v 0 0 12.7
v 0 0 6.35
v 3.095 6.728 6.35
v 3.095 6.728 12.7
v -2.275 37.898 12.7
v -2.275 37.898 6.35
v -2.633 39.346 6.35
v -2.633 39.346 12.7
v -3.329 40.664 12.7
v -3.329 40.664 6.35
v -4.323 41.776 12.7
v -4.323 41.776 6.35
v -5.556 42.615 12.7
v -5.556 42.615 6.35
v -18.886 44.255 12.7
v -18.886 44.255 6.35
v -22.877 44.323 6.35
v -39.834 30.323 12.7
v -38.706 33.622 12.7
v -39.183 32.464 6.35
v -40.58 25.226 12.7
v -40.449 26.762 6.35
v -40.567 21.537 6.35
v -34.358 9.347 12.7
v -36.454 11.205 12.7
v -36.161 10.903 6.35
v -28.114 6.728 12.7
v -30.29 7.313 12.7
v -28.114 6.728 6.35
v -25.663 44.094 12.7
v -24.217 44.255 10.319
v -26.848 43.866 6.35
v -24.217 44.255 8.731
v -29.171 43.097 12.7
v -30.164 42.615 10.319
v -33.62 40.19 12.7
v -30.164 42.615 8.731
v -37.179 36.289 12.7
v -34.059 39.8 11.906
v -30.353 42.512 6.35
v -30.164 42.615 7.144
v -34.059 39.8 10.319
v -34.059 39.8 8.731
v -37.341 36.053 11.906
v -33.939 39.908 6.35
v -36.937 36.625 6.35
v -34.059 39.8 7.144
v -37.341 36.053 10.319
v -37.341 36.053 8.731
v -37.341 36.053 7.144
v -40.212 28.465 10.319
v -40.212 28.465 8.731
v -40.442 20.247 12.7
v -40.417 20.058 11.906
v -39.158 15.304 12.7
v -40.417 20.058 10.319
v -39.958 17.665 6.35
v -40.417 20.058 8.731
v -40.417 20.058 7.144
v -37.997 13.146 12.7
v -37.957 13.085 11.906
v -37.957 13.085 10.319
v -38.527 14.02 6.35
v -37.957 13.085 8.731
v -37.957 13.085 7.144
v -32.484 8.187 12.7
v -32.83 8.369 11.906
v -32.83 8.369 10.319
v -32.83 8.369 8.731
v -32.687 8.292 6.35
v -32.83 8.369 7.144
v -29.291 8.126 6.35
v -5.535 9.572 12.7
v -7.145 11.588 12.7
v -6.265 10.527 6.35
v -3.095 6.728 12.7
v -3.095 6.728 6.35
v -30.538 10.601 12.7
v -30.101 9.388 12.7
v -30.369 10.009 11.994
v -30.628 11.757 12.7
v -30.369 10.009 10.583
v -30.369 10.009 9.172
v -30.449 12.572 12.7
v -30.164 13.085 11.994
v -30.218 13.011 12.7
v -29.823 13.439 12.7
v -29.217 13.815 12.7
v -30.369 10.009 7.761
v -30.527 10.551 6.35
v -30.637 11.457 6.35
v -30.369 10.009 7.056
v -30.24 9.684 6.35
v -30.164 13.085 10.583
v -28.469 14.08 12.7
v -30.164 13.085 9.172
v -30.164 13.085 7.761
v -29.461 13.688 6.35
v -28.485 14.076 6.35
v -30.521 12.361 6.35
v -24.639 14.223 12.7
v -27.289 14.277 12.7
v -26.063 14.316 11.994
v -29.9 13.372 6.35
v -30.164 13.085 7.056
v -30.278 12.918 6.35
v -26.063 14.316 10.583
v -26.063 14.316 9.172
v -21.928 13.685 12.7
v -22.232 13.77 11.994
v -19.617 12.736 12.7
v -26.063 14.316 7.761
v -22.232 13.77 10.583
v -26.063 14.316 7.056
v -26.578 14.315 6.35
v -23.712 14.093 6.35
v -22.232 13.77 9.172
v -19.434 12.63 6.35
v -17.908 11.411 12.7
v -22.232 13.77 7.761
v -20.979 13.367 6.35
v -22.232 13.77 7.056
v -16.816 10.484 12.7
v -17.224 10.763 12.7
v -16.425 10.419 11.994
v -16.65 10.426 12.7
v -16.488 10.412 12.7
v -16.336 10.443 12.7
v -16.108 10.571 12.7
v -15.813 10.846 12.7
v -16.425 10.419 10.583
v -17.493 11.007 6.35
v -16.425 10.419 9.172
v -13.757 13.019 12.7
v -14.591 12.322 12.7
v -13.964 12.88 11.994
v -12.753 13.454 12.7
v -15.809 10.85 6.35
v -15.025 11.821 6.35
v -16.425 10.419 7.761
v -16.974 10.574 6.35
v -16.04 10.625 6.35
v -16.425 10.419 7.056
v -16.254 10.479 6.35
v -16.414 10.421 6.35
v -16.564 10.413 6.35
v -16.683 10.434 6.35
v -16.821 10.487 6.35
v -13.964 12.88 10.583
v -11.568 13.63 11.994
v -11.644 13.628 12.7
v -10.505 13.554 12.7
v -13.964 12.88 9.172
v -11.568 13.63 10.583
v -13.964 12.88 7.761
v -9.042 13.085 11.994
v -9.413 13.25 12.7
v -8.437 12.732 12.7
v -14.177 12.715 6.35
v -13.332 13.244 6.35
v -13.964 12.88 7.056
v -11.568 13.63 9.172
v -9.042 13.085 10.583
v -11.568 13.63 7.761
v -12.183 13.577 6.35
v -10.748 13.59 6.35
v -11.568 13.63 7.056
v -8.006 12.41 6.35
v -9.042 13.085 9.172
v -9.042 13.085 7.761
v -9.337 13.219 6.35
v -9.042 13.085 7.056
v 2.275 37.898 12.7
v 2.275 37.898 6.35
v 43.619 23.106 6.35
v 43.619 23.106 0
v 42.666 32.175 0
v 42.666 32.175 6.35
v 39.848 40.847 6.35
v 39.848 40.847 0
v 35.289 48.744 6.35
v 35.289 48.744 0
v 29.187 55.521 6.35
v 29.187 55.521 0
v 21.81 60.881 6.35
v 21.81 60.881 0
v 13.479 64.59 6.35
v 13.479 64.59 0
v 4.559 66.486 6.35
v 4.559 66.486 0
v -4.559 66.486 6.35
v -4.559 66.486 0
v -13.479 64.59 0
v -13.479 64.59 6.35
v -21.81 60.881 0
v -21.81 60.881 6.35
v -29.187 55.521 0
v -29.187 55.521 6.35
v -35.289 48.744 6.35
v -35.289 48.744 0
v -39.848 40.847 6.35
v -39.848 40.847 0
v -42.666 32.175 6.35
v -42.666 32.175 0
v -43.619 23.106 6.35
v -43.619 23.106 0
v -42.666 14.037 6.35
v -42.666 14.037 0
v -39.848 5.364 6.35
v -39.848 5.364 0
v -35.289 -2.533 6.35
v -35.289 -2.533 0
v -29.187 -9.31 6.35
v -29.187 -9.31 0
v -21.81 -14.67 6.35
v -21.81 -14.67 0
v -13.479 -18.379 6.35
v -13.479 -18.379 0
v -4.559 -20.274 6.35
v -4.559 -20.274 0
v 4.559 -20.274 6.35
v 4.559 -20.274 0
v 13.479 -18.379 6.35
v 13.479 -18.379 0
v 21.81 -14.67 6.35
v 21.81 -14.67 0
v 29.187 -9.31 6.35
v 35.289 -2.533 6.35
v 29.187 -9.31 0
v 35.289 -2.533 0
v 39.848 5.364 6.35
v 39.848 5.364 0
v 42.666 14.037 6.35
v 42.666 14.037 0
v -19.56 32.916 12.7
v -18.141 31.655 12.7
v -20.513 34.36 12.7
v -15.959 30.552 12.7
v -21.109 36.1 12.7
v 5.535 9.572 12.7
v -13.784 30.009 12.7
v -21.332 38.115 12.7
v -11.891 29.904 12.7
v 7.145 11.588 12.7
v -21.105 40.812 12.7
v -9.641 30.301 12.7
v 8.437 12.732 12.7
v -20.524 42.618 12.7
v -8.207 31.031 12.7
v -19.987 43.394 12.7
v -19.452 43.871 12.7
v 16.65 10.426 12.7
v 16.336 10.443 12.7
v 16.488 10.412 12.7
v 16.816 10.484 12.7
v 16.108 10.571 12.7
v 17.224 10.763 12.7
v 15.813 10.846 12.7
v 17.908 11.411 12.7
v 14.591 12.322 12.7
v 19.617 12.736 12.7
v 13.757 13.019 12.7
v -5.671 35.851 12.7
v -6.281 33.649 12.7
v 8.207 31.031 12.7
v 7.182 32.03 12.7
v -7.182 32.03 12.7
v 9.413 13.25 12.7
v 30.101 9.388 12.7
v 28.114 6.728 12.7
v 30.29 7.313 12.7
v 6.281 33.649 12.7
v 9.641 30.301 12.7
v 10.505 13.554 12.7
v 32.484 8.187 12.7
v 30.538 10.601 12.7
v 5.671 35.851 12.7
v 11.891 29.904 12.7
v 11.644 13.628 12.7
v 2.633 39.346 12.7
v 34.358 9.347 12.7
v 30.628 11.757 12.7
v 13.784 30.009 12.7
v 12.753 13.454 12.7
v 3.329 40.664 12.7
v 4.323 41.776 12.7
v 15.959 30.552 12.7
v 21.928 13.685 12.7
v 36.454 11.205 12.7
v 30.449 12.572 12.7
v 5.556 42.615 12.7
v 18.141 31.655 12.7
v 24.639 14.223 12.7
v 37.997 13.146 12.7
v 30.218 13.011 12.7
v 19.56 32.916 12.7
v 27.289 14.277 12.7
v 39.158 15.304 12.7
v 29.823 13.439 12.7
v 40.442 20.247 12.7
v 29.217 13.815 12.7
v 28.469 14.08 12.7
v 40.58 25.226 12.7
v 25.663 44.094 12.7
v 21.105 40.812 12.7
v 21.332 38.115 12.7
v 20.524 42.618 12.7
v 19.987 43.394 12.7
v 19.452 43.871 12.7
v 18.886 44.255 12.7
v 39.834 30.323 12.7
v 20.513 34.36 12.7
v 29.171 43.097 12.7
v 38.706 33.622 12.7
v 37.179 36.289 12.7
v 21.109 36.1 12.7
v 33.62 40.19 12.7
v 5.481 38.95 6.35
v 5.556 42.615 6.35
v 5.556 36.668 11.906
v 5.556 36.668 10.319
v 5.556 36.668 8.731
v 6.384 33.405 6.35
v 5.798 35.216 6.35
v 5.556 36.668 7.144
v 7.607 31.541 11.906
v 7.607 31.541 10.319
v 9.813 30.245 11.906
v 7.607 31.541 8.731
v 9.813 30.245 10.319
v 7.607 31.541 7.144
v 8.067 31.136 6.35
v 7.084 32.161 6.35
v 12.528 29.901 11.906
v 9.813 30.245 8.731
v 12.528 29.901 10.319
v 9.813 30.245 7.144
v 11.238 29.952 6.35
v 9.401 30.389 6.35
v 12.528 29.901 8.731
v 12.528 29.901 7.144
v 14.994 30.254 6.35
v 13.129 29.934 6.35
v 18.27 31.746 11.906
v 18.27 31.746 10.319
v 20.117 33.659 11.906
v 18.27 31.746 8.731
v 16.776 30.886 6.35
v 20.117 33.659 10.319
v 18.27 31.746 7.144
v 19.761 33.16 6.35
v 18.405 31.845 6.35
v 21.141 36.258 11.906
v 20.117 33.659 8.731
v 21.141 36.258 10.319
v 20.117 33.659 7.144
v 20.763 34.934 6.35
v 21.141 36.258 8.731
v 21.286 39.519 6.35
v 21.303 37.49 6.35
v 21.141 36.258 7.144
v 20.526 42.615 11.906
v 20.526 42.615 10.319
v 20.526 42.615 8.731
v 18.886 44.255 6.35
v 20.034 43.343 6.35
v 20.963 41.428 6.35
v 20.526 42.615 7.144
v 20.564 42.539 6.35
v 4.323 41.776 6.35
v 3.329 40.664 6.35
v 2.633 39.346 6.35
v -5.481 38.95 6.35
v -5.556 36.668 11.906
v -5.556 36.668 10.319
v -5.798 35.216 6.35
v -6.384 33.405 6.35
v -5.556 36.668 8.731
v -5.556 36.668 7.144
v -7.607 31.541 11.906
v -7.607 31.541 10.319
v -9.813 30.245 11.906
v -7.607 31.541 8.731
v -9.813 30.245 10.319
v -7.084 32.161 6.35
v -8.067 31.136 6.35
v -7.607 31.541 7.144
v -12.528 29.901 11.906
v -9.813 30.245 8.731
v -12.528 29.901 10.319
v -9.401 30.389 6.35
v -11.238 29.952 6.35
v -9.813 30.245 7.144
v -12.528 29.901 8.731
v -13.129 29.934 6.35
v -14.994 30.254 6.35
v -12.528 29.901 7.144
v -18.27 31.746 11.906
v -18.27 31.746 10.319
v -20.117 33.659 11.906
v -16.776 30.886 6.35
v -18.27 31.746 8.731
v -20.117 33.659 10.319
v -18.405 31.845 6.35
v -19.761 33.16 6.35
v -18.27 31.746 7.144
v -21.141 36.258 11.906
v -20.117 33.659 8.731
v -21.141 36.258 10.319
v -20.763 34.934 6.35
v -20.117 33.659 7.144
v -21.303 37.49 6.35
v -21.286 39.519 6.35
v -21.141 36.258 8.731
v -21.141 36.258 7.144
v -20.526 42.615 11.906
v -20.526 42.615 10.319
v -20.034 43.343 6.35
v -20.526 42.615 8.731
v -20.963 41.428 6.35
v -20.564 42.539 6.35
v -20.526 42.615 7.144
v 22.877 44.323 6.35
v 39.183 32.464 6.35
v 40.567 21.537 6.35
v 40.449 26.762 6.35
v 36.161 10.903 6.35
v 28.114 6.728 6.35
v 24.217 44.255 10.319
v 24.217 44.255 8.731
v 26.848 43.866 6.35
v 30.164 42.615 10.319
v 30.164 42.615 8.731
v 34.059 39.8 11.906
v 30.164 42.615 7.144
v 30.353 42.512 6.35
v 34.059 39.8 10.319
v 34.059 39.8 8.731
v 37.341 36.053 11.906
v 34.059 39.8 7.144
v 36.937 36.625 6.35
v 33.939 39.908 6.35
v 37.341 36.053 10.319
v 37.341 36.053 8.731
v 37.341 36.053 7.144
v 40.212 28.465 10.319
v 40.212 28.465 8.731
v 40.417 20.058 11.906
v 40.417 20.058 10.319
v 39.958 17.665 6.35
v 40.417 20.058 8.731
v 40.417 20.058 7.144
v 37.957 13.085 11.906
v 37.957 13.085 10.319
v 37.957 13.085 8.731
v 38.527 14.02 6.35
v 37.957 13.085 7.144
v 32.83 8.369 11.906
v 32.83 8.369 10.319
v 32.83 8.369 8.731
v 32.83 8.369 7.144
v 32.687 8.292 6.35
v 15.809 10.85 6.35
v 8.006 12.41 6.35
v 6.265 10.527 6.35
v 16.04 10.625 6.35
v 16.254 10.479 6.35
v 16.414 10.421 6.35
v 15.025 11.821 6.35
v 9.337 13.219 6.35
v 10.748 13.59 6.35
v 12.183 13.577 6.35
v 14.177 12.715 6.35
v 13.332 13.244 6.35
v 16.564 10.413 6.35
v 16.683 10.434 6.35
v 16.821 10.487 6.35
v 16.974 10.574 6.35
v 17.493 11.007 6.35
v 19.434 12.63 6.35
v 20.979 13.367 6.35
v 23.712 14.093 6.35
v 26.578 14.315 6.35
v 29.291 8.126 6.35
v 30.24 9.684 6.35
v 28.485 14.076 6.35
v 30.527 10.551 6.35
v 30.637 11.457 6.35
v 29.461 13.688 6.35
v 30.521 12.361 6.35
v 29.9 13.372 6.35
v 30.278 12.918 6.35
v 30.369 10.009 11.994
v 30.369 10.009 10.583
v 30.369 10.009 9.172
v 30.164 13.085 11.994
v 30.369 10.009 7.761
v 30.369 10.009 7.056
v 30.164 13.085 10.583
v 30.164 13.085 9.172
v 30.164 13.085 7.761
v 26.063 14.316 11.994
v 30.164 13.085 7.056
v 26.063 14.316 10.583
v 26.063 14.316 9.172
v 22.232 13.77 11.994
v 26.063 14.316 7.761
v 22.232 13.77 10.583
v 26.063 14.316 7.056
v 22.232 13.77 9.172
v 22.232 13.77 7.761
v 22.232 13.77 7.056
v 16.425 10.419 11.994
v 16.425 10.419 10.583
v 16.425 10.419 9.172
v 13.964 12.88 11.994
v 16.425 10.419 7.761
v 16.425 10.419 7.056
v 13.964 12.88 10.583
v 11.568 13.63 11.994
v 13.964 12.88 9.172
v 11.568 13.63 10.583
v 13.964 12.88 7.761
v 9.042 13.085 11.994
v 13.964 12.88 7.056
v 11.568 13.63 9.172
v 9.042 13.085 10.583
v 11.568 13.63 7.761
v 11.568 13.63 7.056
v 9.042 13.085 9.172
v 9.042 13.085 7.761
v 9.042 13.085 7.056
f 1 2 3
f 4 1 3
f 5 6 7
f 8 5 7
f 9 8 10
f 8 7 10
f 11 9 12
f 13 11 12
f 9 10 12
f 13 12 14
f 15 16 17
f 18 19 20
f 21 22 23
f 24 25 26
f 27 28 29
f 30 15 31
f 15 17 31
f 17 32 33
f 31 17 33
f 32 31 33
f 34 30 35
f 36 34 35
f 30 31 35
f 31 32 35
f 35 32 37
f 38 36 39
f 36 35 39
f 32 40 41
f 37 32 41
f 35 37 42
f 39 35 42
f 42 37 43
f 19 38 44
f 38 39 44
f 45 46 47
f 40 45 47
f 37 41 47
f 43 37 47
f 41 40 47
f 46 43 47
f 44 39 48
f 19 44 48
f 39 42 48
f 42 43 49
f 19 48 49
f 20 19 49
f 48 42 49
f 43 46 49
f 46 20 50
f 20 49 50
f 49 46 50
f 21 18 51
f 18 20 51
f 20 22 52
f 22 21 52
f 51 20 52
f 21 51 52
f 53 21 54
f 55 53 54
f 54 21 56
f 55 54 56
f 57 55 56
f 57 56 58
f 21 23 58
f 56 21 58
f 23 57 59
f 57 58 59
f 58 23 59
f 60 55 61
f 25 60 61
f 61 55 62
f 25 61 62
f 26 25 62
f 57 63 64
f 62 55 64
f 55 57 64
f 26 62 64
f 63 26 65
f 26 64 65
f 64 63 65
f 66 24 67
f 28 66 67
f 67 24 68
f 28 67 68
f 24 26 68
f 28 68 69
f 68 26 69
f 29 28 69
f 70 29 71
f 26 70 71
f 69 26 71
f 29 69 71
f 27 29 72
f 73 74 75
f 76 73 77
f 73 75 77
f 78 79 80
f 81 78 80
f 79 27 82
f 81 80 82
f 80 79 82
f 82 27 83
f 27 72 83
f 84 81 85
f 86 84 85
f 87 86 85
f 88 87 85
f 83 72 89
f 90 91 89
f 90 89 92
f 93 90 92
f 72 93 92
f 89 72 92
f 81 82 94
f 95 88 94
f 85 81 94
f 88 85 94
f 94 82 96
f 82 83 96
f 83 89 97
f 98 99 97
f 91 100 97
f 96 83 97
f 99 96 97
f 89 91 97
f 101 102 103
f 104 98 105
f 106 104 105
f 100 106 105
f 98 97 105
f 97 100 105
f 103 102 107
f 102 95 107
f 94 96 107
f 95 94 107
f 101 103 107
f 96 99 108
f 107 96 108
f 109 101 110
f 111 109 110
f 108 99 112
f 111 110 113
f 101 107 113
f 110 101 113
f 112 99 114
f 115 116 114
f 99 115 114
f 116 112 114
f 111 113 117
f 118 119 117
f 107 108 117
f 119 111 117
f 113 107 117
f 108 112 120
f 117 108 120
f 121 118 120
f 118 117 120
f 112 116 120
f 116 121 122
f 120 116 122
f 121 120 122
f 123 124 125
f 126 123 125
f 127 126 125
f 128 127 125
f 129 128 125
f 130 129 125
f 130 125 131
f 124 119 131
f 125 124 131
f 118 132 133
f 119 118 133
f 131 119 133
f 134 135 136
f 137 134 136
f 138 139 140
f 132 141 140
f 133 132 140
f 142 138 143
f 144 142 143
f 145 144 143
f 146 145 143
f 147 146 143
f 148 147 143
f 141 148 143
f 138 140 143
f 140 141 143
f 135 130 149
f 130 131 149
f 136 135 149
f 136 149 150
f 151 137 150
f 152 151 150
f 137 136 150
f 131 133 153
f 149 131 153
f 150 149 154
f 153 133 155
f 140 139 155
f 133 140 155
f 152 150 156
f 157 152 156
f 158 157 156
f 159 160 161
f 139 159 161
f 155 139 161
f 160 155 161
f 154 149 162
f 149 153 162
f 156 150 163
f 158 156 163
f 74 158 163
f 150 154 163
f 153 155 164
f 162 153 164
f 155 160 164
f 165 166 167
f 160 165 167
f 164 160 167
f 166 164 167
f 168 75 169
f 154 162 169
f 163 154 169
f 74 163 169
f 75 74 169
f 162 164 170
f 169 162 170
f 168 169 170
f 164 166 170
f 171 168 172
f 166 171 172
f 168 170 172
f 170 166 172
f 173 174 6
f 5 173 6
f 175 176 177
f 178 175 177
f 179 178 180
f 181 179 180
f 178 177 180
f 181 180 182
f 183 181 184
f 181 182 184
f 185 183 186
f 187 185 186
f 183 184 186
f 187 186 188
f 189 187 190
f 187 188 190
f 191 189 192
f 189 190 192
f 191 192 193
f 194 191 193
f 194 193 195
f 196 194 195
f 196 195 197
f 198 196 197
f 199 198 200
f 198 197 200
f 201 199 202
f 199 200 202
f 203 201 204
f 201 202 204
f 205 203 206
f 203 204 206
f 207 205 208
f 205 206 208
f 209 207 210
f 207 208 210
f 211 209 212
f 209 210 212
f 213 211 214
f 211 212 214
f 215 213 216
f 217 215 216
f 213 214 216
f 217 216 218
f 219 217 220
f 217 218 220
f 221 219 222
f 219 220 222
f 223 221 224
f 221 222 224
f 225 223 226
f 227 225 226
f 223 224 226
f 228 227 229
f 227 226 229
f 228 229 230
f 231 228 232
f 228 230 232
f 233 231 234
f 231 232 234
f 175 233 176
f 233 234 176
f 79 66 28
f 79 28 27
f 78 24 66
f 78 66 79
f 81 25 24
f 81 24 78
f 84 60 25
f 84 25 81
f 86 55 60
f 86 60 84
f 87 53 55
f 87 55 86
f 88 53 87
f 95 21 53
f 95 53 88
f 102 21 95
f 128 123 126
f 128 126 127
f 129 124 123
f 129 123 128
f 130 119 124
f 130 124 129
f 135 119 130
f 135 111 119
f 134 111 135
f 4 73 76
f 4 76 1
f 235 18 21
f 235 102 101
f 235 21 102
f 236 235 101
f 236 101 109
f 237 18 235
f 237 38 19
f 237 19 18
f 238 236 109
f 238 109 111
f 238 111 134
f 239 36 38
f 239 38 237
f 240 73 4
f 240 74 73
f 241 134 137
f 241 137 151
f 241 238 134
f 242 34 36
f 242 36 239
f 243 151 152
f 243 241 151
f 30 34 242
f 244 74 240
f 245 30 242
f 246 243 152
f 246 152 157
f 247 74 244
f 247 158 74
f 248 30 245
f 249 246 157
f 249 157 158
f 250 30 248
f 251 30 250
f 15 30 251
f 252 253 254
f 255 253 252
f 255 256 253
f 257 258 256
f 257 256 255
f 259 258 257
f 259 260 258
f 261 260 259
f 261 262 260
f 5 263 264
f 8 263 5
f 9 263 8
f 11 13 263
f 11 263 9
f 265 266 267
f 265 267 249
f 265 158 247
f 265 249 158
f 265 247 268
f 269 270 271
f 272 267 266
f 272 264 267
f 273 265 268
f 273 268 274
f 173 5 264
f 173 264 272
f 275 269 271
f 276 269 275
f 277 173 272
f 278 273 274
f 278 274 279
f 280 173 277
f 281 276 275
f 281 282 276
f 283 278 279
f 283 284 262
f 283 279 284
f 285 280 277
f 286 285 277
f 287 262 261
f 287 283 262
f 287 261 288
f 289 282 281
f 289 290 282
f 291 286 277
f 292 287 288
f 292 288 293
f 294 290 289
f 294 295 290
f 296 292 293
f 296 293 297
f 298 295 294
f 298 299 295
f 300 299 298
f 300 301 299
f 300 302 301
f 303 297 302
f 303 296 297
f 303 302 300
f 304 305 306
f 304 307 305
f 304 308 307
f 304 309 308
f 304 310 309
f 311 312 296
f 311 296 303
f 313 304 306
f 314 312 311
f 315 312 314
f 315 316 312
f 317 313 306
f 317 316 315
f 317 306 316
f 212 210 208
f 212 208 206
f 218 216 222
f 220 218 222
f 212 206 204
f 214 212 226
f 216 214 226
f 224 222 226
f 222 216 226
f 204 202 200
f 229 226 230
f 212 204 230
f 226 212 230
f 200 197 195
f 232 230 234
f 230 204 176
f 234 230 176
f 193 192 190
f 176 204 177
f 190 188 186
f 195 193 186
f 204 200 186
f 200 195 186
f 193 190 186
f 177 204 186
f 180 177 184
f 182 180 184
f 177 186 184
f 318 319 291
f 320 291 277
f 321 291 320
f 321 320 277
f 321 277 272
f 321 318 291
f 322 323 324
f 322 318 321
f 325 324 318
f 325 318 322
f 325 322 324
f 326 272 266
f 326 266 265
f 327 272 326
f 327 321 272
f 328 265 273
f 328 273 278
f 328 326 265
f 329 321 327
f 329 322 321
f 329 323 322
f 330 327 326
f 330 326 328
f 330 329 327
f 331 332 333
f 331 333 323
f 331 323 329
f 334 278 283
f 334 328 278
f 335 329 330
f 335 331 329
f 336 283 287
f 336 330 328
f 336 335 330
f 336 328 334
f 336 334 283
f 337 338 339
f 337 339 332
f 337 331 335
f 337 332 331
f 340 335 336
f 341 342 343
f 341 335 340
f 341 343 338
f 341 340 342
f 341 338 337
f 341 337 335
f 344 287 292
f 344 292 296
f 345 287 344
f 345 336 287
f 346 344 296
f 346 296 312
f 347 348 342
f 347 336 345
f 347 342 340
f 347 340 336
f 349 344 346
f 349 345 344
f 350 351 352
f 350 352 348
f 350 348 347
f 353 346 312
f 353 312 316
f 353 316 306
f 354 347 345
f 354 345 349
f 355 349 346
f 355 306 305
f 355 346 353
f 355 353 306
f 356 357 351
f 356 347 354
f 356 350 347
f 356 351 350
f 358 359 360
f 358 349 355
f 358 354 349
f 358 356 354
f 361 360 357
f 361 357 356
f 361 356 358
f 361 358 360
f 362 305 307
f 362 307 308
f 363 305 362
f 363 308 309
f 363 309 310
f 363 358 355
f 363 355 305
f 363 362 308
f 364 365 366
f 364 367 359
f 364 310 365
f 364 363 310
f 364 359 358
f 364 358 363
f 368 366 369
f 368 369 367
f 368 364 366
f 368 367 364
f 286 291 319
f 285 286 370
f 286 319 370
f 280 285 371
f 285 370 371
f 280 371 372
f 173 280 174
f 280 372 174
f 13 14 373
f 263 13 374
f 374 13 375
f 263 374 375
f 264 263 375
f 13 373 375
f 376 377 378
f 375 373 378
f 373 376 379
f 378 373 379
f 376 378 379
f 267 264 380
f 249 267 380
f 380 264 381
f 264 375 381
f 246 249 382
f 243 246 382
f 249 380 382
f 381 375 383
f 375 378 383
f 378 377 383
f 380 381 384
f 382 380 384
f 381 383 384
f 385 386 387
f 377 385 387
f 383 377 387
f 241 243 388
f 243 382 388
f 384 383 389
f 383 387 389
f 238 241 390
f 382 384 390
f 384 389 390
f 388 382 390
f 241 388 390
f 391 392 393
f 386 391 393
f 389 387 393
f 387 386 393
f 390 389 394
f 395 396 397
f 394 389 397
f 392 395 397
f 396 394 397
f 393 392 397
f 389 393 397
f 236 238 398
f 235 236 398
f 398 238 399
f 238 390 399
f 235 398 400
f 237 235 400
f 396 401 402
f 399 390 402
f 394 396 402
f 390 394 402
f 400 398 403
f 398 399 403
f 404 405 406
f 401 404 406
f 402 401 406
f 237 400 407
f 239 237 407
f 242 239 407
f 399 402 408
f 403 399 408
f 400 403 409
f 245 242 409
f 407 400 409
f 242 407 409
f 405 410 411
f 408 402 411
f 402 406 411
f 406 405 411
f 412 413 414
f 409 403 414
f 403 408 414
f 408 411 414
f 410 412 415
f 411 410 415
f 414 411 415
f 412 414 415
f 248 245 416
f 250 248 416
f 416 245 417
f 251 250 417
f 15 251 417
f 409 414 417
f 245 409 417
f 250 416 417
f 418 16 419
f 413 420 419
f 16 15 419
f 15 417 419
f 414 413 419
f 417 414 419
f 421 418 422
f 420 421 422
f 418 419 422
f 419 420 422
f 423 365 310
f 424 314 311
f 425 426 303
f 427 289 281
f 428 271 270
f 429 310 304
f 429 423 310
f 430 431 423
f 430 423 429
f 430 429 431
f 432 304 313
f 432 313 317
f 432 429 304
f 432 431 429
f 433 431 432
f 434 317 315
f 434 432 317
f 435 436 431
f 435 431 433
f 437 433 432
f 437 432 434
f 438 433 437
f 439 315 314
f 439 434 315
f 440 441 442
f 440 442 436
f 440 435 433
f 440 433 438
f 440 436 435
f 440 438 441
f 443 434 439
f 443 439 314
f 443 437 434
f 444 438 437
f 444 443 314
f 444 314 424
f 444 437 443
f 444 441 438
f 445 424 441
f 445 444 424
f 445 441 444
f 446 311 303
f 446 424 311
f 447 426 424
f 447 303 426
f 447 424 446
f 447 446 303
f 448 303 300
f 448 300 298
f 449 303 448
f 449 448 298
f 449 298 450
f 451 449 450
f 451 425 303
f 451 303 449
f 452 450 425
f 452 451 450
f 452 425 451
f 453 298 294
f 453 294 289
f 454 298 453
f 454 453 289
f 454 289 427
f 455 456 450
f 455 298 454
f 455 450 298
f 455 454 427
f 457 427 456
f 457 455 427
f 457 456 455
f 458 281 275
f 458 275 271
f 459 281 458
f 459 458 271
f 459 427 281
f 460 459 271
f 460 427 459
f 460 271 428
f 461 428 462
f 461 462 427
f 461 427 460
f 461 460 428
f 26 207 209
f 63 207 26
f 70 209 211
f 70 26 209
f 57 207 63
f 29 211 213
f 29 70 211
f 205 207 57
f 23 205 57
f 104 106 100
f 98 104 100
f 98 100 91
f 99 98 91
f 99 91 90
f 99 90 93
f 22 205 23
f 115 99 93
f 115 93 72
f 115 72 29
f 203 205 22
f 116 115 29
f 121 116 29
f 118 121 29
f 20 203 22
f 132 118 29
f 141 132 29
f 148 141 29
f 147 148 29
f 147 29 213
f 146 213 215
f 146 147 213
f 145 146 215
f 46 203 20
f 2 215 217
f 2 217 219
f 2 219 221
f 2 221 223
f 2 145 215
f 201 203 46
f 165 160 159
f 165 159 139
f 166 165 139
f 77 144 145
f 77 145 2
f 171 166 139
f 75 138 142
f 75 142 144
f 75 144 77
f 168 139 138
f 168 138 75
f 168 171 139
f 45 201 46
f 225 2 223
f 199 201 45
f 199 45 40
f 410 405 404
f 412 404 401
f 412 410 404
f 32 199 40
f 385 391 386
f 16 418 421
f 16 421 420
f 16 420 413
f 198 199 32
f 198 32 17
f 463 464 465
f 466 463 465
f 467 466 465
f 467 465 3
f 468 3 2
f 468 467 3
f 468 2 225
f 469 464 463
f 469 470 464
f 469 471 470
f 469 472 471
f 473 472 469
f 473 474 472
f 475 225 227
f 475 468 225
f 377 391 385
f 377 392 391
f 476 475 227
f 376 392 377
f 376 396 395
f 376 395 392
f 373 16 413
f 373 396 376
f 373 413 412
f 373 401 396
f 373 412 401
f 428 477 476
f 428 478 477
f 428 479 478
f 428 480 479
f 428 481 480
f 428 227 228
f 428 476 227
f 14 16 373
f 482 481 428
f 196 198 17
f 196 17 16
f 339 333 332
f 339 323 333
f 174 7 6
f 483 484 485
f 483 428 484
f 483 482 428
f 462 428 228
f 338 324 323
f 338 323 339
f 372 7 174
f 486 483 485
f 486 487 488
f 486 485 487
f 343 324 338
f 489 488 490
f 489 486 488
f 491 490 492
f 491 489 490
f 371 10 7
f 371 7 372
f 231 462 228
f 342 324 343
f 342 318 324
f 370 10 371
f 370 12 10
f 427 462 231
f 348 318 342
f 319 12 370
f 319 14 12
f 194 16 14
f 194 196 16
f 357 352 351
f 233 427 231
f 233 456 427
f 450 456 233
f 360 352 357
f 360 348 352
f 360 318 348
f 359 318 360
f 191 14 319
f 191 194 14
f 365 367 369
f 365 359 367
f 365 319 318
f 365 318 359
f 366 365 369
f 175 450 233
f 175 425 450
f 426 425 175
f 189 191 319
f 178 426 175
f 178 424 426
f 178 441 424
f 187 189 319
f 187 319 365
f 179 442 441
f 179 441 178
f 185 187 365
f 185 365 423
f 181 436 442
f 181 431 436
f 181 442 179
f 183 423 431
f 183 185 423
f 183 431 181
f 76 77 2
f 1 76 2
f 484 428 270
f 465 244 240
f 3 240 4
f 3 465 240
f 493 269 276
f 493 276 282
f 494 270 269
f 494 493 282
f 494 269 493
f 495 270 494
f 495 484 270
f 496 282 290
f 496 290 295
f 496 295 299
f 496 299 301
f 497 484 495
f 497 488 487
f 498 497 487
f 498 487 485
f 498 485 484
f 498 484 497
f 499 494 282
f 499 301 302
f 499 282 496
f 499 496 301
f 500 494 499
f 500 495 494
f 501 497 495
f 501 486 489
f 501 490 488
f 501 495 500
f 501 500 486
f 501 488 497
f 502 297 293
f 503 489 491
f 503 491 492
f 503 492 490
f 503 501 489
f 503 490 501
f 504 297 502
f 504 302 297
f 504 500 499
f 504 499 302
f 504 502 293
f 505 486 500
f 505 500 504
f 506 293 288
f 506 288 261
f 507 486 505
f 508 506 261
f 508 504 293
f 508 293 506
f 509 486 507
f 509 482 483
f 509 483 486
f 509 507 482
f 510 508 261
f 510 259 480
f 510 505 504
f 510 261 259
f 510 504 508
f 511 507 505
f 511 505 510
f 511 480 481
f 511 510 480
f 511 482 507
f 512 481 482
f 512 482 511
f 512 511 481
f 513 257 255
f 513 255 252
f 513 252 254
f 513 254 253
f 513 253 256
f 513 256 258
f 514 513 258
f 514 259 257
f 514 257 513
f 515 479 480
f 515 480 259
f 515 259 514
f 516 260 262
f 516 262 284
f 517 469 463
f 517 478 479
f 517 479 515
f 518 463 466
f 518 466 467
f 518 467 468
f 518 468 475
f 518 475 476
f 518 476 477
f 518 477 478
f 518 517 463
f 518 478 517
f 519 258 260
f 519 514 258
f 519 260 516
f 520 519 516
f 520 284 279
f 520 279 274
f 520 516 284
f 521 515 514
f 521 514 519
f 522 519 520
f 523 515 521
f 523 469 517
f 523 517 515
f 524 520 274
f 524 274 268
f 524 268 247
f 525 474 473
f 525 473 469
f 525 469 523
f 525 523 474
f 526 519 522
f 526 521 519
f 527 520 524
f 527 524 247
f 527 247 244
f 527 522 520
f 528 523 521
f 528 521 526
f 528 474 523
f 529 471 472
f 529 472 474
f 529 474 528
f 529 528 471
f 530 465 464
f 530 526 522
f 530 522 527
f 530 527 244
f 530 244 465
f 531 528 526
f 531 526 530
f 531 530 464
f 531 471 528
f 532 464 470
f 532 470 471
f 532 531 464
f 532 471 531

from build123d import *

# Parameters (mm, degrees)
F1_DEPTH = 12.7
F2_R     = 43.6191573148
F3_DEPTH = 6.35


with BuildPart() as f1:
    # F0 (on Top) → F1 (new body)
    with BuildSketch(Plane.XY):
        with BuildLine():
            Line((0, 0), (0, 37.8982871771))
            Line((0, 37.8982871771), (-2.275184961, 37.8982871771))
            ThreePointArc((-2.275184961, 37.8982871771), (-3.3292846535, 40.6644971337), (-5.5562416092, 42.6148064435))
            add(Edge.make_bspline(
                [(-5.5562416092, 42.6148064435), (-5.5703494023, 42.0142906079), (-5.6046526216, 40.5541312384), (-5.2393125388, 36.5954113309), (-6.9424896141, 30.8100461219), (-12.5971795214, 29.3403889147), (-18.6948655551, 31.2430954584), (-21.8441499469, 35.8922942841), (-21.076998542, 42.8397482949), (-19.484435303, 43.8684772866), (-18.8855398446, 44.2553386092)],
                knots=[0, 0, 0, 0, 0.082920529, 0.2016219726, 0.3411436581, 0.4763827565, 0.6222008099, 0.7595052437, 0.9095601268, 1, 1, 1, 1], degree=3))
            add(Edge.make_bspline(
                [(-18.8855398446, 44.2553386092), (-20.6560426877, 44.3237199963), (-24.33100703, 44.4656565993), (-30.5408431936, 43.2410311856), (-38.1067126016, 36.3732548524), (-40.566015012, 28.6181305798), (-40.8792325724, 20.0231651092), (-38.5999285071, 12.8430202709), (-33.0856876554, 7.9563134123), (-29.6765484701, 7.1142909532), (-28.113514185, 6.7282374948)],
                knots=[0, 0, 0, 0, 0.1086472767, 0.2255149543, 0.3722485622, 0.5062658434, 0.642720627, 0.7706640779, 0.894853249, 1, 1, 1, 1], degree=3))
            add(Edge.make_bspline(
                [(-28.113514185, 6.7282374948), (-29.0246689047, 7.7597666145), (-30.7375643135, 9.6989559255), (-30.7756235682, 13.7303881075), (-25.8604407658, 14.7900899125), (-18.7823382808, 13.149739601), (-16.3501787334, 9.1177684328), (-14.3329084621, 13.866950264), (-8.5187134641, 13.8232988977), (-5.6398384057, 9.5322456261), (-3.9052846126, 7.6207055193), (-3.0954487156, 6.7282374948)],
                knots=[0, 0, 0, 0, 0.1075326967, 0.2021525636, 0.3136658959, 0.4609002606, 0.5554153026, 0.6559470898, 0.775552028, 0.8952087704, 1, 1, 1, 1], degree=3))
            Line((-3.0954487156, 6.7282374948), (0, 0))
        make_face()
        with BuildLine():
            Line((2.275184961, 37.8982871771), (0, 37.8982871771))
            Line((0, 37.8982871771), (0, 0))
            Line((0, 0), (3.0954487156, 6.7282374948))
            add(Edge.make_bspline(
                [(28.113514185, 6.7282374948), (29.0246689047, 7.7597666145), (30.7375643135, 9.6989559255), (30.7756235682, 13.7303881075), (25.8604407658, 14.7900899125), (18.7823382808, 13.149739601), (16.3501787334, 9.1177684328), (14.3329084621, 13.866950264), (8.5187134641, 13.8232988977), (5.6398384057, 9.5322456261), (3.9052846126, 7.6207055193), (3.0954487156, 6.7282374948)],
                knots=[0, 0, 0, 0, 0.1075326967, 0.2021525636, 0.3136658959, 0.4609002606, 0.5554153026, 0.6559470898, 0.775552028, 0.8952087704, 1, 1, 1, 1], degree=3))
            add(Edge.make_bspline(
                [(18.8855398446, 44.2553386092), (20.6560426877, 44.3237199963), (24.33100703, 44.4656565993), (30.5408431936, 43.2410311856), (38.1067126016, 36.3732548524), (40.566015012, 28.6181305798), (40.8792325724, 20.0231651092), (38.5999285071, 12.8430202709), (33.0856876554, 7.9563134123), (29.6765484701, 7.1142909532), (28.113514185, 6.7282374948)],
                knots=[0, 0, 0, 0, 0.1086472767, 0.2255149543, 0.3722485622, 0.5062658434, 0.642720627, 0.7706640779, 0.894853249, 1, 1, 1, 1], degree=3))
            add(Edge.make_bspline(
                [(5.5562416092, 42.6148064435), (5.5703494023, 42.0142906079), (5.6046526216, 40.5541312384), (5.2393125388, 36.5954113309), (6.9424896141, 30.8100461219), (12.5971795214, 29.3403889147), (18.6948655551, 31.2430954584), (21.8441499469, 35.8922942841), (21.076998542, 42.8397482949), (19.484435303, 43.8684772866), (18.8855398446, 44.2553386092)],
                knots=[0, 0, 0, 0, 0.082920529, 0.2016219726, 0.3411436581, 0.4763827565, 0.6222008099, 0.7595052437, 0.9095601268, 1, 1, 1, 1], degree=3))
            ThreePointArc((5.5562416092, 42.6148064435), (3.3292846535, 40.6644971337), (2.275184961, 37.8982871771))
        make_face()
    extrude(amount=F1_DEPTH)

    # F2 (on Top) → F3 (join)
    with BuildSketch(Plane.XY):
        with Locations((0, 23.1057424098)):
            Circle(F2_R)
    extrude(amount=F3_DEPTH)


solid = f1.part
